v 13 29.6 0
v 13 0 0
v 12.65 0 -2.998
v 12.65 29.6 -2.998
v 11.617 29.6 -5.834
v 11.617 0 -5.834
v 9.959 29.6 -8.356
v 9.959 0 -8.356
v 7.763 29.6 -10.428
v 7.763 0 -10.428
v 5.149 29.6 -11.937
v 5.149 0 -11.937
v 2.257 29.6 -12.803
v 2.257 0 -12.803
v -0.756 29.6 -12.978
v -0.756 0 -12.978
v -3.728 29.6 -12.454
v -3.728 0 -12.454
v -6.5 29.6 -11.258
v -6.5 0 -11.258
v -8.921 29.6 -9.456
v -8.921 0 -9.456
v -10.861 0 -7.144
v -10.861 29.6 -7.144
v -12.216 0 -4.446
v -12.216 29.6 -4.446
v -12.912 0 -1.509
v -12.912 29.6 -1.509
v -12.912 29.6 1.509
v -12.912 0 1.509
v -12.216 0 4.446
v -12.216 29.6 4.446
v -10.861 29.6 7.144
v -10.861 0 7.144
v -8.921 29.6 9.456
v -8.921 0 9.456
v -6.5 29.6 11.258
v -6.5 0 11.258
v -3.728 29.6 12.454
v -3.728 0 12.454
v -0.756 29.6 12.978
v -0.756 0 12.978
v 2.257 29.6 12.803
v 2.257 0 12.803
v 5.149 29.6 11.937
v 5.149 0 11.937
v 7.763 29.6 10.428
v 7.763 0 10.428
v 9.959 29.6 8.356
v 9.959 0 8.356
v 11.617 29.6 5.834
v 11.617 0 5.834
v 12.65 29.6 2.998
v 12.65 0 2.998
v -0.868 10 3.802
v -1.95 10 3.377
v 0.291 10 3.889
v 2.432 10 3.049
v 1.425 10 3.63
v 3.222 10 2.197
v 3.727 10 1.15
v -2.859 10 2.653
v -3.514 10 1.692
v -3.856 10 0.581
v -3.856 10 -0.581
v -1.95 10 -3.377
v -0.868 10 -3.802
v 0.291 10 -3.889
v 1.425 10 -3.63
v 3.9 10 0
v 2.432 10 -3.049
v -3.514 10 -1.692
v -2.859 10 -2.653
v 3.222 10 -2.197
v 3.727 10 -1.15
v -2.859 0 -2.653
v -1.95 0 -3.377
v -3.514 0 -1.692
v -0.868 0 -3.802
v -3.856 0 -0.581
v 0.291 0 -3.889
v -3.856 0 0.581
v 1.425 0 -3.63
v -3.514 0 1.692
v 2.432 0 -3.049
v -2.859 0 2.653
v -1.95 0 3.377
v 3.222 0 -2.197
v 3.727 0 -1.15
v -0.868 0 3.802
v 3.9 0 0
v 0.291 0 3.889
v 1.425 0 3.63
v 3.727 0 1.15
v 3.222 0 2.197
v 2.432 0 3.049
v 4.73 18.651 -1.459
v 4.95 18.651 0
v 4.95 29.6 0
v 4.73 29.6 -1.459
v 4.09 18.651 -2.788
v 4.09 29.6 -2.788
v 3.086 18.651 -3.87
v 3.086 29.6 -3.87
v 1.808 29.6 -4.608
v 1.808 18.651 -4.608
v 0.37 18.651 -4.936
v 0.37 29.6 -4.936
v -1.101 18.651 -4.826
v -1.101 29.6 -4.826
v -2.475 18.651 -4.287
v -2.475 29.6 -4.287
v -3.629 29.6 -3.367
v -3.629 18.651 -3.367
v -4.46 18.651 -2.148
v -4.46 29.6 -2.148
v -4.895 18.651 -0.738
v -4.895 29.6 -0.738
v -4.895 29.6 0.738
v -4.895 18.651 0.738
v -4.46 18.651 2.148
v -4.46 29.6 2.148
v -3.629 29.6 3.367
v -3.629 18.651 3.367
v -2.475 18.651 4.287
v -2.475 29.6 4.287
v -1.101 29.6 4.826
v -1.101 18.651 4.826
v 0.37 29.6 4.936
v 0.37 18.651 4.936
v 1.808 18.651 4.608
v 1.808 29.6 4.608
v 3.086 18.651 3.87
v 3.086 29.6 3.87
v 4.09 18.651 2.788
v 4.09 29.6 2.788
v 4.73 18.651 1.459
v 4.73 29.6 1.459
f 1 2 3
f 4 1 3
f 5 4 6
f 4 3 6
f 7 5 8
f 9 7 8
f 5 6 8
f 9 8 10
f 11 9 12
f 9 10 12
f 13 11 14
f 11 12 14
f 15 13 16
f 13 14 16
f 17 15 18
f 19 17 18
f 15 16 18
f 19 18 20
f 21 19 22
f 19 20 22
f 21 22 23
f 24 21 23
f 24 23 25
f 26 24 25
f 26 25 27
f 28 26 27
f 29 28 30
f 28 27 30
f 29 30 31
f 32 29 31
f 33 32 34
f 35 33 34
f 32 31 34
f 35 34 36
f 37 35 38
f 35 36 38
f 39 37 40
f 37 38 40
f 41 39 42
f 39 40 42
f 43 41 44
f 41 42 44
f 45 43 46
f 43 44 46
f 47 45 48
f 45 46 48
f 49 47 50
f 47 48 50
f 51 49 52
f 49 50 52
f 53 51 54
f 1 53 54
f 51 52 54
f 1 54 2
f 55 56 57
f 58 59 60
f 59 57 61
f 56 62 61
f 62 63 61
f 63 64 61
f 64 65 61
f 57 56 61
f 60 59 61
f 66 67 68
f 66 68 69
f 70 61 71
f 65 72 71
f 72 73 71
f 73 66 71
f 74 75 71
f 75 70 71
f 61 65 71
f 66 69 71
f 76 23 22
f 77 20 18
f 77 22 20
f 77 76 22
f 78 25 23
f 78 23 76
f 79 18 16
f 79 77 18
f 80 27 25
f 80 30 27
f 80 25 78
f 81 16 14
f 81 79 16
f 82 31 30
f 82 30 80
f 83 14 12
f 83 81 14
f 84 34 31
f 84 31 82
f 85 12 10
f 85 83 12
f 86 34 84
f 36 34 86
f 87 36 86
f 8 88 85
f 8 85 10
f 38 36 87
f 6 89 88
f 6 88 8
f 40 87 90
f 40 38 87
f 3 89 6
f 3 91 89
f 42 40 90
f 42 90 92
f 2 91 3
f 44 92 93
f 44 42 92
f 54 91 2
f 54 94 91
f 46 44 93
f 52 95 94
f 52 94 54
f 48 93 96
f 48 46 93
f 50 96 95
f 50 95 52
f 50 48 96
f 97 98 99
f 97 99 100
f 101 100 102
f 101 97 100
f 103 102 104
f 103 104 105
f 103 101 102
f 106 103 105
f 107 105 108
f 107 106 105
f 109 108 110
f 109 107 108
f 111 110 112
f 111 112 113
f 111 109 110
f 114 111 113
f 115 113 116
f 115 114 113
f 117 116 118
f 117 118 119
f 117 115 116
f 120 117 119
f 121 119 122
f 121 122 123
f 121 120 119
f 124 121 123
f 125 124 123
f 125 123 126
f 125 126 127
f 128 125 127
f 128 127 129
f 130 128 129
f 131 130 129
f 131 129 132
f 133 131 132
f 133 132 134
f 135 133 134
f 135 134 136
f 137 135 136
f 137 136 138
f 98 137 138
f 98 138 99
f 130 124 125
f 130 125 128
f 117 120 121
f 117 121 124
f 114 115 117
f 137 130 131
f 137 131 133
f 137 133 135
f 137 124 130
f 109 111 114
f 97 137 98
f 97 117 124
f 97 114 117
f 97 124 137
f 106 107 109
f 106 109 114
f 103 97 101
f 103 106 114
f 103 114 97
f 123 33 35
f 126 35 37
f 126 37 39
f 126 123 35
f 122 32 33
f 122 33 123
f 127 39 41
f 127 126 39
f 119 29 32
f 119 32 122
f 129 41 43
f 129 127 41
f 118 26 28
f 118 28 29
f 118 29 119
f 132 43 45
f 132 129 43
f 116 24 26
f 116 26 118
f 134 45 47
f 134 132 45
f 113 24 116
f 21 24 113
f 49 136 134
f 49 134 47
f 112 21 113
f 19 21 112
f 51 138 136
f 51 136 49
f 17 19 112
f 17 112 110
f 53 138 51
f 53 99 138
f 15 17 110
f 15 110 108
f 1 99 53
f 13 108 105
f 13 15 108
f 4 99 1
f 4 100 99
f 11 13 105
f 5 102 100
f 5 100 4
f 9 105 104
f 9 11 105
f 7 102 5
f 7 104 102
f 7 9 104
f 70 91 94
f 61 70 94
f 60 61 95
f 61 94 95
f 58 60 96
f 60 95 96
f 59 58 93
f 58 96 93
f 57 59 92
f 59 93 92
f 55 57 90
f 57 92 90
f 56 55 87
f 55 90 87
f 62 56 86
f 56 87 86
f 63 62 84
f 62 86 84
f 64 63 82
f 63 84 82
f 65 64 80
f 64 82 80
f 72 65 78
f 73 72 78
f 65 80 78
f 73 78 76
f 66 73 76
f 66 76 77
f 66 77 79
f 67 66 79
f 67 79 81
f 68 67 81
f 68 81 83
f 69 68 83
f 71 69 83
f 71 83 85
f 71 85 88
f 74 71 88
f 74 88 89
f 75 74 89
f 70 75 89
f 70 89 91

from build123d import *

# Parameters (mm, degrees)
SKETCH1_R           = 13
SKETCH1_R_2         = 4.95
BOSS_EXTRUDE1_DEPTH = 29.6
SKETCH2_R           = 4.95
BOSS_EXTRUDE3_DEPTH = 8.650573
SKETCH3_R           = 4.95
SKETCH3_R_2         = 3.9
BOSS_EXTRUDE4_DEPTH = 11.85


with BuildPart() as part:
    # Sketch1 → Boss-Extrude1 (new body)
    with BuildSketch(Plane(origin=(0, 0, 0), x_dir=(1, 0, 0), z_dir=(0, 1, 0))):
        Circle(SKETCH1_R)
        Circle(SKETCH1_R_2, mode=Mode.SUBTRACT)
    extrude(amount=BOSS_EXTRUDE1_DEPTH)

    # Sketch2 → Boss-Extrude3 (add)
    with BuildSketch(Plane(origin=(0, 18.650573, 0), x_dir=(1, 0, 0), z_dir=(0, 1, 0))):
        Circle(SKETCH2_R)
    extrude(amount=-BOSS_EXTRUDE3_DEPTH)

    # Sketch3 → Boss-Extrude4 (add)
    with BuildSketch(Plane.XZ):
        Circle(SKETCH3_R)
        Circle(SKETCH3_R_2, mode=Mode.SUBTRACT)
    extrude(amount=-BOSS_EXTRUDE4_DEPTH)


solid = part.part
